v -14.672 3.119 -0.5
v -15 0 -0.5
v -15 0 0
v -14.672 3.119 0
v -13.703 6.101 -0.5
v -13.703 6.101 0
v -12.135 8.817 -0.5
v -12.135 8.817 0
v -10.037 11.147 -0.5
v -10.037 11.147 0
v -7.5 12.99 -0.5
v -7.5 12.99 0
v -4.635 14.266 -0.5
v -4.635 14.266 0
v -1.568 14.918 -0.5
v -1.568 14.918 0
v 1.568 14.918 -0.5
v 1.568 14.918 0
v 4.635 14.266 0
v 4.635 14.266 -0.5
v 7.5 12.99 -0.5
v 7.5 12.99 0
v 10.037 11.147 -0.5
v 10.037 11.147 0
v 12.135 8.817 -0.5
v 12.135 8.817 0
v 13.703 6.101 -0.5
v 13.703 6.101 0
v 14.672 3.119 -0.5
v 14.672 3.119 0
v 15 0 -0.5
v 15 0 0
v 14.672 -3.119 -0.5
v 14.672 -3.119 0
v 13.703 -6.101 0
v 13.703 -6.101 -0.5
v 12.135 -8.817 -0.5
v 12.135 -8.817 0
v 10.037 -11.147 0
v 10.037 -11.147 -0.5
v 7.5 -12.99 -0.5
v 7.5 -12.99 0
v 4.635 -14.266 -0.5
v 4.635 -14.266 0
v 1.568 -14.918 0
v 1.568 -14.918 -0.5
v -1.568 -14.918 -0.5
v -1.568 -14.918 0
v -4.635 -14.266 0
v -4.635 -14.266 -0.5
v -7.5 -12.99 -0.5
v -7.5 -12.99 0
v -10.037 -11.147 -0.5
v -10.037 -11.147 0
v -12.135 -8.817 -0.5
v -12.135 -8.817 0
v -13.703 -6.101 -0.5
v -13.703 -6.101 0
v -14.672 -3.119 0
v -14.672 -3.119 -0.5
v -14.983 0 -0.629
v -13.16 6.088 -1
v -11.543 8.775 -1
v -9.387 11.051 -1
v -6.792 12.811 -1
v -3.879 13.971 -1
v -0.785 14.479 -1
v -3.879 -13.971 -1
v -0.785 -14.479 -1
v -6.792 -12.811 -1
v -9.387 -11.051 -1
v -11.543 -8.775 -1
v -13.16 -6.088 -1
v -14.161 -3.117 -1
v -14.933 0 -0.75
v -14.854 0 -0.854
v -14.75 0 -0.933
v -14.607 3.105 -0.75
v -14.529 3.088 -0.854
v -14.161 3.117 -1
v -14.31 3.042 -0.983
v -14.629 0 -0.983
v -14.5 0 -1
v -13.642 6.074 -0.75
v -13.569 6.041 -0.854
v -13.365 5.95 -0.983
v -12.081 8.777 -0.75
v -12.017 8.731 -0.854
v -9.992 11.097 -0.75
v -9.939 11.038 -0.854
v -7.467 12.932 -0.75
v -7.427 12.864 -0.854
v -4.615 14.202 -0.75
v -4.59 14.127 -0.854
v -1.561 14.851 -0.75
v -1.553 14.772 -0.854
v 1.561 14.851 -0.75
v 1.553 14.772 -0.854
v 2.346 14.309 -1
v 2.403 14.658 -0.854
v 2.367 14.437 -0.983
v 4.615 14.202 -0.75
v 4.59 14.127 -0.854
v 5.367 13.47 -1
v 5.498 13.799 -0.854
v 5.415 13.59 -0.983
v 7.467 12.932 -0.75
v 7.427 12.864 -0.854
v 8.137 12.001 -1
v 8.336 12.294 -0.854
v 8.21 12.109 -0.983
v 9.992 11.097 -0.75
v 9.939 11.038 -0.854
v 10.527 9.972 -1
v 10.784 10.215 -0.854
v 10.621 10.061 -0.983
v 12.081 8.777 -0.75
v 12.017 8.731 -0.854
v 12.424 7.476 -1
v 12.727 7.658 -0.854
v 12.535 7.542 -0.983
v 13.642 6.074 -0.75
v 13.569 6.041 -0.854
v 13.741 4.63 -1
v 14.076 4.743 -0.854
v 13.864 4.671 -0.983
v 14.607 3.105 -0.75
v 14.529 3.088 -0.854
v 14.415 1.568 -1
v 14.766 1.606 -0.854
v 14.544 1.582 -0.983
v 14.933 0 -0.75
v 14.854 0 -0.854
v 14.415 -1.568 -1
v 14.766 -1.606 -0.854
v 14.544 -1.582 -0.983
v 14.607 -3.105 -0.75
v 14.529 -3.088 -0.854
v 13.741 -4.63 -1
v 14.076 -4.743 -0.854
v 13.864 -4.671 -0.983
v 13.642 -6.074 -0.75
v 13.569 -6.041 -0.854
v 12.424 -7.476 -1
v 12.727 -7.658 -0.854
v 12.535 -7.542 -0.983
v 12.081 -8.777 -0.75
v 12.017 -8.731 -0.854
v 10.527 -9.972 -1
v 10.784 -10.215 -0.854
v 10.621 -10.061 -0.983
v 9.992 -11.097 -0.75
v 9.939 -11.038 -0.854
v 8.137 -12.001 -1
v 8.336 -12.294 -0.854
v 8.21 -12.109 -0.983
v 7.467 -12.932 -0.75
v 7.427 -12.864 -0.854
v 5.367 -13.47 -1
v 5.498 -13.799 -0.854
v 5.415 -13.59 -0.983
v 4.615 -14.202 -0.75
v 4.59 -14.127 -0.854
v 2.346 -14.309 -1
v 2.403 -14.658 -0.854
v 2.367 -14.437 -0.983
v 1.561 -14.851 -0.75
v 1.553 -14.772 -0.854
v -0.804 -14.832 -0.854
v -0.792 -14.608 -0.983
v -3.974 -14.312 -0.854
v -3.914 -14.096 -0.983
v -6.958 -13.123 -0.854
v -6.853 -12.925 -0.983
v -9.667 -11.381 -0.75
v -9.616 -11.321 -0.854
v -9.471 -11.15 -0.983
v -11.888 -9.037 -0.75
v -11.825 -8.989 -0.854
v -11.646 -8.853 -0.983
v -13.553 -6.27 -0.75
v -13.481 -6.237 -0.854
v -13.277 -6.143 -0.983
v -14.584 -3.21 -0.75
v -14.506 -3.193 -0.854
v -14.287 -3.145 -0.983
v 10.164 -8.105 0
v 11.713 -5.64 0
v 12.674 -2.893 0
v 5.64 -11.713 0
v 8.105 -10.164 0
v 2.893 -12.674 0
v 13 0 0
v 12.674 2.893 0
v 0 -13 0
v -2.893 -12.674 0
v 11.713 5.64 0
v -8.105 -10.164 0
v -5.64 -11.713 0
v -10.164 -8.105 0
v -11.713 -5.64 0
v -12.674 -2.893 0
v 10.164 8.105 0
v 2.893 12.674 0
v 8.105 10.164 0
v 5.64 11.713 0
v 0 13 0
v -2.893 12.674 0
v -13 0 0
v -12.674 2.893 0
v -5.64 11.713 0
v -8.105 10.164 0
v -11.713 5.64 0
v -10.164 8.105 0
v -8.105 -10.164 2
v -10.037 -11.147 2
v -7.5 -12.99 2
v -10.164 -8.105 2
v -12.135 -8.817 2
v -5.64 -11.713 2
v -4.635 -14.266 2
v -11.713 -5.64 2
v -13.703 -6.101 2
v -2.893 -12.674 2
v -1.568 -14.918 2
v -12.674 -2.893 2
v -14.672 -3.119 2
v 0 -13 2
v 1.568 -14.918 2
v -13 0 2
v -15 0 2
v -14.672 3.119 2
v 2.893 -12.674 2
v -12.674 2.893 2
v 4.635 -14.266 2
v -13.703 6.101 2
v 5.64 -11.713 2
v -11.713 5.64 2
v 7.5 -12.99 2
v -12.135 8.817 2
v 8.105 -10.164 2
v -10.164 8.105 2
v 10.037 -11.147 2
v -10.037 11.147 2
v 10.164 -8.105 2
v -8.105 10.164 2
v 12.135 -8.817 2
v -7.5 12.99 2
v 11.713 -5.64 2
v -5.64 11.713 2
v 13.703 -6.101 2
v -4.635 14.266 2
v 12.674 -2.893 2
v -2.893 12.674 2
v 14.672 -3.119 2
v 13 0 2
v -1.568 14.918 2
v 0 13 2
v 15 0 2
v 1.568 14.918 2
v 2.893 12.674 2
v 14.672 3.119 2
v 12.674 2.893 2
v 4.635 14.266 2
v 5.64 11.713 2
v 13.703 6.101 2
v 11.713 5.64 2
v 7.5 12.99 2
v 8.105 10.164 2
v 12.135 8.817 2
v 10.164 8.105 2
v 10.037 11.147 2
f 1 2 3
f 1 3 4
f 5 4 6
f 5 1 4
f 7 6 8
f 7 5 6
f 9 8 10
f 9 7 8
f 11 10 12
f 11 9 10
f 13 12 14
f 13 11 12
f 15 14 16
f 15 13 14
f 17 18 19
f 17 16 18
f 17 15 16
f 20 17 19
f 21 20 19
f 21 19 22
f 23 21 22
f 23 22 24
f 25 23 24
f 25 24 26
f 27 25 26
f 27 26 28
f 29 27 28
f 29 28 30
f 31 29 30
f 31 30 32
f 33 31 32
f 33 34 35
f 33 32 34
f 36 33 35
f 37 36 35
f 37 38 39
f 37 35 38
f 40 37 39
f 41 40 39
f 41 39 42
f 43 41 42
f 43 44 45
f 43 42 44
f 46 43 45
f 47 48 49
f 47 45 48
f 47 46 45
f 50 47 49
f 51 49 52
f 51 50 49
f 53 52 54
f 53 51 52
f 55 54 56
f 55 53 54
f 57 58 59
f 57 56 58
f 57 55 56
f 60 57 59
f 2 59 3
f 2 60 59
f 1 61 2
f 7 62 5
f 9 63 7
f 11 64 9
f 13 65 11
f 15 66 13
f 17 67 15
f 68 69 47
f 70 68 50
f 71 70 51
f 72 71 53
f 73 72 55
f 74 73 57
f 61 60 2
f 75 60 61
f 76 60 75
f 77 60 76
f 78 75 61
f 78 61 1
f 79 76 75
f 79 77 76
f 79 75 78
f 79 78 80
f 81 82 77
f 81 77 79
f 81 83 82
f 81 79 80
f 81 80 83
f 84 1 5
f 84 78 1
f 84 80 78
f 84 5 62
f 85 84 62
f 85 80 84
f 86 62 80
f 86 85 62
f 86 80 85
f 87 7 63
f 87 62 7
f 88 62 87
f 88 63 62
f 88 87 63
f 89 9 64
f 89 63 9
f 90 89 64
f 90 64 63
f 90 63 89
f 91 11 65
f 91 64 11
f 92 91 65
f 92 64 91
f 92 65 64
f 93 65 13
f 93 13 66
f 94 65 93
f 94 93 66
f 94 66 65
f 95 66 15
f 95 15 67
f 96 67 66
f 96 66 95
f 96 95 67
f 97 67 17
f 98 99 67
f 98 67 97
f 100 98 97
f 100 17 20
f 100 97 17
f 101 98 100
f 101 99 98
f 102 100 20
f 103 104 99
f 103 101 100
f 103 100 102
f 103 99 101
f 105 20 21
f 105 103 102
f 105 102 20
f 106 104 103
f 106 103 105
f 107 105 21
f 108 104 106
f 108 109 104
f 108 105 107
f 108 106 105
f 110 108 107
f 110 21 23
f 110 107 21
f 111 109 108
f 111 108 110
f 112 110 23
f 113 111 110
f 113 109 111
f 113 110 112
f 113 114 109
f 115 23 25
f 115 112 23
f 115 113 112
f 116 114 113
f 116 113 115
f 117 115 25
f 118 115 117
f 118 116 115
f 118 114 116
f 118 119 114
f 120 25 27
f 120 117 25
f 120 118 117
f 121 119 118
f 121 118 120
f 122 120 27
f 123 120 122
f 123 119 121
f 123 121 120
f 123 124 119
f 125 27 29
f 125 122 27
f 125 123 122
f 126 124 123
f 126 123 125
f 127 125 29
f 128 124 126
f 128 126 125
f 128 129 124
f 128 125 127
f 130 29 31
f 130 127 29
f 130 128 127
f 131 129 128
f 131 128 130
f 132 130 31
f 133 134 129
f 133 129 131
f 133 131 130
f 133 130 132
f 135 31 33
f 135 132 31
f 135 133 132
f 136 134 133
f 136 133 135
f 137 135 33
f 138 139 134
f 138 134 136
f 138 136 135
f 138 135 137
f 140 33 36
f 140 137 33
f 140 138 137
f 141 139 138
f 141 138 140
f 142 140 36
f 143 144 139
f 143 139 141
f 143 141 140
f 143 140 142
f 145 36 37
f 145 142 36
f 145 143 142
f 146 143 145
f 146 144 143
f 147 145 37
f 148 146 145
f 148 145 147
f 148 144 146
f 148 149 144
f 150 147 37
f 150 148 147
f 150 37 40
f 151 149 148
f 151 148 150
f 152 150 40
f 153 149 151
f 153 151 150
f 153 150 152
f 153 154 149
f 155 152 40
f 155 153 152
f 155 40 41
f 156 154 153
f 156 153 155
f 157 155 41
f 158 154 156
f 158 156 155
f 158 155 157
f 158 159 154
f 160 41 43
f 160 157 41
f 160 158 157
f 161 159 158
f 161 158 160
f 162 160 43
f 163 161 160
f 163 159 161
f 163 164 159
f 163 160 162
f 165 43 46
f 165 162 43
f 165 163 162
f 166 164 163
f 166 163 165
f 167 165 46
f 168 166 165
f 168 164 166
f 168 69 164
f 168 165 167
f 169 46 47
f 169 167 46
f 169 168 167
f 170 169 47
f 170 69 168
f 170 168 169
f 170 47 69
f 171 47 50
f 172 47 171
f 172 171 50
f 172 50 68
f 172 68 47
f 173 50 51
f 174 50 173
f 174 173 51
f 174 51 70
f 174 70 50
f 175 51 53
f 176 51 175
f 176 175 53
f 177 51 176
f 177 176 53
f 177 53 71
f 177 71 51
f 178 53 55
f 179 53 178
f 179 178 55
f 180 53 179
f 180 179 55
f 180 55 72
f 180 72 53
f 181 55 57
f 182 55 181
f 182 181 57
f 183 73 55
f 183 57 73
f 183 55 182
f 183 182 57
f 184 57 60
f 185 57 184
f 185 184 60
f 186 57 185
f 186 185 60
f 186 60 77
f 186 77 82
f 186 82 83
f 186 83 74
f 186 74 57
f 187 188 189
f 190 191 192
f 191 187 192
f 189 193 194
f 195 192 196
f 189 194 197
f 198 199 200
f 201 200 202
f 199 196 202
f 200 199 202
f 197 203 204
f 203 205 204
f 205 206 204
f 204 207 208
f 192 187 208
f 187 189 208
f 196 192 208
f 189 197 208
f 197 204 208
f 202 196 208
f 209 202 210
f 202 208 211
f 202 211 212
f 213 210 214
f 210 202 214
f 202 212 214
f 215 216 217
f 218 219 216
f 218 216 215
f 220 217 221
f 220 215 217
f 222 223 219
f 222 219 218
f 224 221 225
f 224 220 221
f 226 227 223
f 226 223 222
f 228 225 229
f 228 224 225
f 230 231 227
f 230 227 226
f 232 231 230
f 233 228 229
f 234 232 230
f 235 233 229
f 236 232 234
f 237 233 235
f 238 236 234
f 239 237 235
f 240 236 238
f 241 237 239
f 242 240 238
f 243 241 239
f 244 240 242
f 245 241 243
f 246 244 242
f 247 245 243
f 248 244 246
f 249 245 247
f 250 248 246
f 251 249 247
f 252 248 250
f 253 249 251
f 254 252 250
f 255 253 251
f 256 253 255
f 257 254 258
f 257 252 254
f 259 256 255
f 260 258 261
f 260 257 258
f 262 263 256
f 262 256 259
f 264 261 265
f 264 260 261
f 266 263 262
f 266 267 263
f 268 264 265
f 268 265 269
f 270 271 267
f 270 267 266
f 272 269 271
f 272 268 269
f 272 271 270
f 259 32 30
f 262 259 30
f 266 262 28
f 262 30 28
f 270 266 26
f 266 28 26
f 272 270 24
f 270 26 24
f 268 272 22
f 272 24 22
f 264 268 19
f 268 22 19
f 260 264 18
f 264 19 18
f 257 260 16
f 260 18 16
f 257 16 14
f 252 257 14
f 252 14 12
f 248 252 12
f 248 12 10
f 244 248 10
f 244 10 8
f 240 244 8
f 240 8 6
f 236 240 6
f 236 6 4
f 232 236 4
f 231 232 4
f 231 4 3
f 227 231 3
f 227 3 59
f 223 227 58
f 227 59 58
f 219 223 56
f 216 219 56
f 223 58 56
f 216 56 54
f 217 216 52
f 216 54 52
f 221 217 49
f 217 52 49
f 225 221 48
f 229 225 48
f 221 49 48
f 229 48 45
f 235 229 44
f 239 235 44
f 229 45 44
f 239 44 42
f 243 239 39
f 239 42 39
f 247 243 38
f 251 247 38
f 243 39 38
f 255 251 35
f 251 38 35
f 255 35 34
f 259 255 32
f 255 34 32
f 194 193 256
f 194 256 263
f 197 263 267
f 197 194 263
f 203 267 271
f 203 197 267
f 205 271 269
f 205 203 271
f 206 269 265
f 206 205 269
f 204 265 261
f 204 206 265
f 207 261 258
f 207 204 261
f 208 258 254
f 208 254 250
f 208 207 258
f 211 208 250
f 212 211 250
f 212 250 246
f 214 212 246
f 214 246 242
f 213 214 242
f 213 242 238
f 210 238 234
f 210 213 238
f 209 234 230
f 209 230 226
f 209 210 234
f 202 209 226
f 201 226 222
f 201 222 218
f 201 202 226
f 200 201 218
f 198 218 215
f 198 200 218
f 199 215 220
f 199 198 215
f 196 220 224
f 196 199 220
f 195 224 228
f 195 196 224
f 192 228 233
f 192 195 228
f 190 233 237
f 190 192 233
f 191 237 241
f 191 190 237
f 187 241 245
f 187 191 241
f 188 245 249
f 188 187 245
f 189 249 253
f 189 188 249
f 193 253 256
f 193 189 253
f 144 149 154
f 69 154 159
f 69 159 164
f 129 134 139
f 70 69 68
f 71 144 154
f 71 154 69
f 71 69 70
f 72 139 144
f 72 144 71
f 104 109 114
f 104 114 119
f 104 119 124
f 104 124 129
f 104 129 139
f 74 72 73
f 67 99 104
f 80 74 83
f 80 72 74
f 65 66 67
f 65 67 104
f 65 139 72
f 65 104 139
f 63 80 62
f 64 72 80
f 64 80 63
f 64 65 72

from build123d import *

# Parameters (mm, degrees)
SKETCH1_R           = 15
SKETCH1_R_2         = 13
BOSS_EXTRUDE1_DEPTH = 2
BOSS_EXTRUDE2_START = 1
SKETCH2_R           = 15
BOSS_EXTRUDE2_DEPTH = 1
FILLET1_R           = 0.5


with BuildPart() as part:
    # Sketch1 → Boss-Extrude1 (new body)
    with BuildSketch(Plane.XY):
        Circle(SKETCH1_R)
        Circle(SKETCH1_R_2, mode=Mode.SUBTRACT)
    extrude(amount=BOSS_EXTRUDE1_DEPTH)

    # Sketch2 → Boss-Extrude2 (add)
    with BuildSketch(Plane(origin=(0, 0, 0), x_dir=(-1, 0, 0), z_dir=(0, 0, -1)).offset(BOSS_EXTRUDE2_START)):
        Circle(SKETCH2_R)
    extrude(amount=-BOSS_EXTRUDE2_DEPTH)

    # Fillet1
    fillet1_edges = [part.edges().sort_by_distance(p)[0] for p in [
        (15, 0, -1),
    ]]
    fillet(fillet1_edges, radius=FILLET1_R)


solid = part.part
